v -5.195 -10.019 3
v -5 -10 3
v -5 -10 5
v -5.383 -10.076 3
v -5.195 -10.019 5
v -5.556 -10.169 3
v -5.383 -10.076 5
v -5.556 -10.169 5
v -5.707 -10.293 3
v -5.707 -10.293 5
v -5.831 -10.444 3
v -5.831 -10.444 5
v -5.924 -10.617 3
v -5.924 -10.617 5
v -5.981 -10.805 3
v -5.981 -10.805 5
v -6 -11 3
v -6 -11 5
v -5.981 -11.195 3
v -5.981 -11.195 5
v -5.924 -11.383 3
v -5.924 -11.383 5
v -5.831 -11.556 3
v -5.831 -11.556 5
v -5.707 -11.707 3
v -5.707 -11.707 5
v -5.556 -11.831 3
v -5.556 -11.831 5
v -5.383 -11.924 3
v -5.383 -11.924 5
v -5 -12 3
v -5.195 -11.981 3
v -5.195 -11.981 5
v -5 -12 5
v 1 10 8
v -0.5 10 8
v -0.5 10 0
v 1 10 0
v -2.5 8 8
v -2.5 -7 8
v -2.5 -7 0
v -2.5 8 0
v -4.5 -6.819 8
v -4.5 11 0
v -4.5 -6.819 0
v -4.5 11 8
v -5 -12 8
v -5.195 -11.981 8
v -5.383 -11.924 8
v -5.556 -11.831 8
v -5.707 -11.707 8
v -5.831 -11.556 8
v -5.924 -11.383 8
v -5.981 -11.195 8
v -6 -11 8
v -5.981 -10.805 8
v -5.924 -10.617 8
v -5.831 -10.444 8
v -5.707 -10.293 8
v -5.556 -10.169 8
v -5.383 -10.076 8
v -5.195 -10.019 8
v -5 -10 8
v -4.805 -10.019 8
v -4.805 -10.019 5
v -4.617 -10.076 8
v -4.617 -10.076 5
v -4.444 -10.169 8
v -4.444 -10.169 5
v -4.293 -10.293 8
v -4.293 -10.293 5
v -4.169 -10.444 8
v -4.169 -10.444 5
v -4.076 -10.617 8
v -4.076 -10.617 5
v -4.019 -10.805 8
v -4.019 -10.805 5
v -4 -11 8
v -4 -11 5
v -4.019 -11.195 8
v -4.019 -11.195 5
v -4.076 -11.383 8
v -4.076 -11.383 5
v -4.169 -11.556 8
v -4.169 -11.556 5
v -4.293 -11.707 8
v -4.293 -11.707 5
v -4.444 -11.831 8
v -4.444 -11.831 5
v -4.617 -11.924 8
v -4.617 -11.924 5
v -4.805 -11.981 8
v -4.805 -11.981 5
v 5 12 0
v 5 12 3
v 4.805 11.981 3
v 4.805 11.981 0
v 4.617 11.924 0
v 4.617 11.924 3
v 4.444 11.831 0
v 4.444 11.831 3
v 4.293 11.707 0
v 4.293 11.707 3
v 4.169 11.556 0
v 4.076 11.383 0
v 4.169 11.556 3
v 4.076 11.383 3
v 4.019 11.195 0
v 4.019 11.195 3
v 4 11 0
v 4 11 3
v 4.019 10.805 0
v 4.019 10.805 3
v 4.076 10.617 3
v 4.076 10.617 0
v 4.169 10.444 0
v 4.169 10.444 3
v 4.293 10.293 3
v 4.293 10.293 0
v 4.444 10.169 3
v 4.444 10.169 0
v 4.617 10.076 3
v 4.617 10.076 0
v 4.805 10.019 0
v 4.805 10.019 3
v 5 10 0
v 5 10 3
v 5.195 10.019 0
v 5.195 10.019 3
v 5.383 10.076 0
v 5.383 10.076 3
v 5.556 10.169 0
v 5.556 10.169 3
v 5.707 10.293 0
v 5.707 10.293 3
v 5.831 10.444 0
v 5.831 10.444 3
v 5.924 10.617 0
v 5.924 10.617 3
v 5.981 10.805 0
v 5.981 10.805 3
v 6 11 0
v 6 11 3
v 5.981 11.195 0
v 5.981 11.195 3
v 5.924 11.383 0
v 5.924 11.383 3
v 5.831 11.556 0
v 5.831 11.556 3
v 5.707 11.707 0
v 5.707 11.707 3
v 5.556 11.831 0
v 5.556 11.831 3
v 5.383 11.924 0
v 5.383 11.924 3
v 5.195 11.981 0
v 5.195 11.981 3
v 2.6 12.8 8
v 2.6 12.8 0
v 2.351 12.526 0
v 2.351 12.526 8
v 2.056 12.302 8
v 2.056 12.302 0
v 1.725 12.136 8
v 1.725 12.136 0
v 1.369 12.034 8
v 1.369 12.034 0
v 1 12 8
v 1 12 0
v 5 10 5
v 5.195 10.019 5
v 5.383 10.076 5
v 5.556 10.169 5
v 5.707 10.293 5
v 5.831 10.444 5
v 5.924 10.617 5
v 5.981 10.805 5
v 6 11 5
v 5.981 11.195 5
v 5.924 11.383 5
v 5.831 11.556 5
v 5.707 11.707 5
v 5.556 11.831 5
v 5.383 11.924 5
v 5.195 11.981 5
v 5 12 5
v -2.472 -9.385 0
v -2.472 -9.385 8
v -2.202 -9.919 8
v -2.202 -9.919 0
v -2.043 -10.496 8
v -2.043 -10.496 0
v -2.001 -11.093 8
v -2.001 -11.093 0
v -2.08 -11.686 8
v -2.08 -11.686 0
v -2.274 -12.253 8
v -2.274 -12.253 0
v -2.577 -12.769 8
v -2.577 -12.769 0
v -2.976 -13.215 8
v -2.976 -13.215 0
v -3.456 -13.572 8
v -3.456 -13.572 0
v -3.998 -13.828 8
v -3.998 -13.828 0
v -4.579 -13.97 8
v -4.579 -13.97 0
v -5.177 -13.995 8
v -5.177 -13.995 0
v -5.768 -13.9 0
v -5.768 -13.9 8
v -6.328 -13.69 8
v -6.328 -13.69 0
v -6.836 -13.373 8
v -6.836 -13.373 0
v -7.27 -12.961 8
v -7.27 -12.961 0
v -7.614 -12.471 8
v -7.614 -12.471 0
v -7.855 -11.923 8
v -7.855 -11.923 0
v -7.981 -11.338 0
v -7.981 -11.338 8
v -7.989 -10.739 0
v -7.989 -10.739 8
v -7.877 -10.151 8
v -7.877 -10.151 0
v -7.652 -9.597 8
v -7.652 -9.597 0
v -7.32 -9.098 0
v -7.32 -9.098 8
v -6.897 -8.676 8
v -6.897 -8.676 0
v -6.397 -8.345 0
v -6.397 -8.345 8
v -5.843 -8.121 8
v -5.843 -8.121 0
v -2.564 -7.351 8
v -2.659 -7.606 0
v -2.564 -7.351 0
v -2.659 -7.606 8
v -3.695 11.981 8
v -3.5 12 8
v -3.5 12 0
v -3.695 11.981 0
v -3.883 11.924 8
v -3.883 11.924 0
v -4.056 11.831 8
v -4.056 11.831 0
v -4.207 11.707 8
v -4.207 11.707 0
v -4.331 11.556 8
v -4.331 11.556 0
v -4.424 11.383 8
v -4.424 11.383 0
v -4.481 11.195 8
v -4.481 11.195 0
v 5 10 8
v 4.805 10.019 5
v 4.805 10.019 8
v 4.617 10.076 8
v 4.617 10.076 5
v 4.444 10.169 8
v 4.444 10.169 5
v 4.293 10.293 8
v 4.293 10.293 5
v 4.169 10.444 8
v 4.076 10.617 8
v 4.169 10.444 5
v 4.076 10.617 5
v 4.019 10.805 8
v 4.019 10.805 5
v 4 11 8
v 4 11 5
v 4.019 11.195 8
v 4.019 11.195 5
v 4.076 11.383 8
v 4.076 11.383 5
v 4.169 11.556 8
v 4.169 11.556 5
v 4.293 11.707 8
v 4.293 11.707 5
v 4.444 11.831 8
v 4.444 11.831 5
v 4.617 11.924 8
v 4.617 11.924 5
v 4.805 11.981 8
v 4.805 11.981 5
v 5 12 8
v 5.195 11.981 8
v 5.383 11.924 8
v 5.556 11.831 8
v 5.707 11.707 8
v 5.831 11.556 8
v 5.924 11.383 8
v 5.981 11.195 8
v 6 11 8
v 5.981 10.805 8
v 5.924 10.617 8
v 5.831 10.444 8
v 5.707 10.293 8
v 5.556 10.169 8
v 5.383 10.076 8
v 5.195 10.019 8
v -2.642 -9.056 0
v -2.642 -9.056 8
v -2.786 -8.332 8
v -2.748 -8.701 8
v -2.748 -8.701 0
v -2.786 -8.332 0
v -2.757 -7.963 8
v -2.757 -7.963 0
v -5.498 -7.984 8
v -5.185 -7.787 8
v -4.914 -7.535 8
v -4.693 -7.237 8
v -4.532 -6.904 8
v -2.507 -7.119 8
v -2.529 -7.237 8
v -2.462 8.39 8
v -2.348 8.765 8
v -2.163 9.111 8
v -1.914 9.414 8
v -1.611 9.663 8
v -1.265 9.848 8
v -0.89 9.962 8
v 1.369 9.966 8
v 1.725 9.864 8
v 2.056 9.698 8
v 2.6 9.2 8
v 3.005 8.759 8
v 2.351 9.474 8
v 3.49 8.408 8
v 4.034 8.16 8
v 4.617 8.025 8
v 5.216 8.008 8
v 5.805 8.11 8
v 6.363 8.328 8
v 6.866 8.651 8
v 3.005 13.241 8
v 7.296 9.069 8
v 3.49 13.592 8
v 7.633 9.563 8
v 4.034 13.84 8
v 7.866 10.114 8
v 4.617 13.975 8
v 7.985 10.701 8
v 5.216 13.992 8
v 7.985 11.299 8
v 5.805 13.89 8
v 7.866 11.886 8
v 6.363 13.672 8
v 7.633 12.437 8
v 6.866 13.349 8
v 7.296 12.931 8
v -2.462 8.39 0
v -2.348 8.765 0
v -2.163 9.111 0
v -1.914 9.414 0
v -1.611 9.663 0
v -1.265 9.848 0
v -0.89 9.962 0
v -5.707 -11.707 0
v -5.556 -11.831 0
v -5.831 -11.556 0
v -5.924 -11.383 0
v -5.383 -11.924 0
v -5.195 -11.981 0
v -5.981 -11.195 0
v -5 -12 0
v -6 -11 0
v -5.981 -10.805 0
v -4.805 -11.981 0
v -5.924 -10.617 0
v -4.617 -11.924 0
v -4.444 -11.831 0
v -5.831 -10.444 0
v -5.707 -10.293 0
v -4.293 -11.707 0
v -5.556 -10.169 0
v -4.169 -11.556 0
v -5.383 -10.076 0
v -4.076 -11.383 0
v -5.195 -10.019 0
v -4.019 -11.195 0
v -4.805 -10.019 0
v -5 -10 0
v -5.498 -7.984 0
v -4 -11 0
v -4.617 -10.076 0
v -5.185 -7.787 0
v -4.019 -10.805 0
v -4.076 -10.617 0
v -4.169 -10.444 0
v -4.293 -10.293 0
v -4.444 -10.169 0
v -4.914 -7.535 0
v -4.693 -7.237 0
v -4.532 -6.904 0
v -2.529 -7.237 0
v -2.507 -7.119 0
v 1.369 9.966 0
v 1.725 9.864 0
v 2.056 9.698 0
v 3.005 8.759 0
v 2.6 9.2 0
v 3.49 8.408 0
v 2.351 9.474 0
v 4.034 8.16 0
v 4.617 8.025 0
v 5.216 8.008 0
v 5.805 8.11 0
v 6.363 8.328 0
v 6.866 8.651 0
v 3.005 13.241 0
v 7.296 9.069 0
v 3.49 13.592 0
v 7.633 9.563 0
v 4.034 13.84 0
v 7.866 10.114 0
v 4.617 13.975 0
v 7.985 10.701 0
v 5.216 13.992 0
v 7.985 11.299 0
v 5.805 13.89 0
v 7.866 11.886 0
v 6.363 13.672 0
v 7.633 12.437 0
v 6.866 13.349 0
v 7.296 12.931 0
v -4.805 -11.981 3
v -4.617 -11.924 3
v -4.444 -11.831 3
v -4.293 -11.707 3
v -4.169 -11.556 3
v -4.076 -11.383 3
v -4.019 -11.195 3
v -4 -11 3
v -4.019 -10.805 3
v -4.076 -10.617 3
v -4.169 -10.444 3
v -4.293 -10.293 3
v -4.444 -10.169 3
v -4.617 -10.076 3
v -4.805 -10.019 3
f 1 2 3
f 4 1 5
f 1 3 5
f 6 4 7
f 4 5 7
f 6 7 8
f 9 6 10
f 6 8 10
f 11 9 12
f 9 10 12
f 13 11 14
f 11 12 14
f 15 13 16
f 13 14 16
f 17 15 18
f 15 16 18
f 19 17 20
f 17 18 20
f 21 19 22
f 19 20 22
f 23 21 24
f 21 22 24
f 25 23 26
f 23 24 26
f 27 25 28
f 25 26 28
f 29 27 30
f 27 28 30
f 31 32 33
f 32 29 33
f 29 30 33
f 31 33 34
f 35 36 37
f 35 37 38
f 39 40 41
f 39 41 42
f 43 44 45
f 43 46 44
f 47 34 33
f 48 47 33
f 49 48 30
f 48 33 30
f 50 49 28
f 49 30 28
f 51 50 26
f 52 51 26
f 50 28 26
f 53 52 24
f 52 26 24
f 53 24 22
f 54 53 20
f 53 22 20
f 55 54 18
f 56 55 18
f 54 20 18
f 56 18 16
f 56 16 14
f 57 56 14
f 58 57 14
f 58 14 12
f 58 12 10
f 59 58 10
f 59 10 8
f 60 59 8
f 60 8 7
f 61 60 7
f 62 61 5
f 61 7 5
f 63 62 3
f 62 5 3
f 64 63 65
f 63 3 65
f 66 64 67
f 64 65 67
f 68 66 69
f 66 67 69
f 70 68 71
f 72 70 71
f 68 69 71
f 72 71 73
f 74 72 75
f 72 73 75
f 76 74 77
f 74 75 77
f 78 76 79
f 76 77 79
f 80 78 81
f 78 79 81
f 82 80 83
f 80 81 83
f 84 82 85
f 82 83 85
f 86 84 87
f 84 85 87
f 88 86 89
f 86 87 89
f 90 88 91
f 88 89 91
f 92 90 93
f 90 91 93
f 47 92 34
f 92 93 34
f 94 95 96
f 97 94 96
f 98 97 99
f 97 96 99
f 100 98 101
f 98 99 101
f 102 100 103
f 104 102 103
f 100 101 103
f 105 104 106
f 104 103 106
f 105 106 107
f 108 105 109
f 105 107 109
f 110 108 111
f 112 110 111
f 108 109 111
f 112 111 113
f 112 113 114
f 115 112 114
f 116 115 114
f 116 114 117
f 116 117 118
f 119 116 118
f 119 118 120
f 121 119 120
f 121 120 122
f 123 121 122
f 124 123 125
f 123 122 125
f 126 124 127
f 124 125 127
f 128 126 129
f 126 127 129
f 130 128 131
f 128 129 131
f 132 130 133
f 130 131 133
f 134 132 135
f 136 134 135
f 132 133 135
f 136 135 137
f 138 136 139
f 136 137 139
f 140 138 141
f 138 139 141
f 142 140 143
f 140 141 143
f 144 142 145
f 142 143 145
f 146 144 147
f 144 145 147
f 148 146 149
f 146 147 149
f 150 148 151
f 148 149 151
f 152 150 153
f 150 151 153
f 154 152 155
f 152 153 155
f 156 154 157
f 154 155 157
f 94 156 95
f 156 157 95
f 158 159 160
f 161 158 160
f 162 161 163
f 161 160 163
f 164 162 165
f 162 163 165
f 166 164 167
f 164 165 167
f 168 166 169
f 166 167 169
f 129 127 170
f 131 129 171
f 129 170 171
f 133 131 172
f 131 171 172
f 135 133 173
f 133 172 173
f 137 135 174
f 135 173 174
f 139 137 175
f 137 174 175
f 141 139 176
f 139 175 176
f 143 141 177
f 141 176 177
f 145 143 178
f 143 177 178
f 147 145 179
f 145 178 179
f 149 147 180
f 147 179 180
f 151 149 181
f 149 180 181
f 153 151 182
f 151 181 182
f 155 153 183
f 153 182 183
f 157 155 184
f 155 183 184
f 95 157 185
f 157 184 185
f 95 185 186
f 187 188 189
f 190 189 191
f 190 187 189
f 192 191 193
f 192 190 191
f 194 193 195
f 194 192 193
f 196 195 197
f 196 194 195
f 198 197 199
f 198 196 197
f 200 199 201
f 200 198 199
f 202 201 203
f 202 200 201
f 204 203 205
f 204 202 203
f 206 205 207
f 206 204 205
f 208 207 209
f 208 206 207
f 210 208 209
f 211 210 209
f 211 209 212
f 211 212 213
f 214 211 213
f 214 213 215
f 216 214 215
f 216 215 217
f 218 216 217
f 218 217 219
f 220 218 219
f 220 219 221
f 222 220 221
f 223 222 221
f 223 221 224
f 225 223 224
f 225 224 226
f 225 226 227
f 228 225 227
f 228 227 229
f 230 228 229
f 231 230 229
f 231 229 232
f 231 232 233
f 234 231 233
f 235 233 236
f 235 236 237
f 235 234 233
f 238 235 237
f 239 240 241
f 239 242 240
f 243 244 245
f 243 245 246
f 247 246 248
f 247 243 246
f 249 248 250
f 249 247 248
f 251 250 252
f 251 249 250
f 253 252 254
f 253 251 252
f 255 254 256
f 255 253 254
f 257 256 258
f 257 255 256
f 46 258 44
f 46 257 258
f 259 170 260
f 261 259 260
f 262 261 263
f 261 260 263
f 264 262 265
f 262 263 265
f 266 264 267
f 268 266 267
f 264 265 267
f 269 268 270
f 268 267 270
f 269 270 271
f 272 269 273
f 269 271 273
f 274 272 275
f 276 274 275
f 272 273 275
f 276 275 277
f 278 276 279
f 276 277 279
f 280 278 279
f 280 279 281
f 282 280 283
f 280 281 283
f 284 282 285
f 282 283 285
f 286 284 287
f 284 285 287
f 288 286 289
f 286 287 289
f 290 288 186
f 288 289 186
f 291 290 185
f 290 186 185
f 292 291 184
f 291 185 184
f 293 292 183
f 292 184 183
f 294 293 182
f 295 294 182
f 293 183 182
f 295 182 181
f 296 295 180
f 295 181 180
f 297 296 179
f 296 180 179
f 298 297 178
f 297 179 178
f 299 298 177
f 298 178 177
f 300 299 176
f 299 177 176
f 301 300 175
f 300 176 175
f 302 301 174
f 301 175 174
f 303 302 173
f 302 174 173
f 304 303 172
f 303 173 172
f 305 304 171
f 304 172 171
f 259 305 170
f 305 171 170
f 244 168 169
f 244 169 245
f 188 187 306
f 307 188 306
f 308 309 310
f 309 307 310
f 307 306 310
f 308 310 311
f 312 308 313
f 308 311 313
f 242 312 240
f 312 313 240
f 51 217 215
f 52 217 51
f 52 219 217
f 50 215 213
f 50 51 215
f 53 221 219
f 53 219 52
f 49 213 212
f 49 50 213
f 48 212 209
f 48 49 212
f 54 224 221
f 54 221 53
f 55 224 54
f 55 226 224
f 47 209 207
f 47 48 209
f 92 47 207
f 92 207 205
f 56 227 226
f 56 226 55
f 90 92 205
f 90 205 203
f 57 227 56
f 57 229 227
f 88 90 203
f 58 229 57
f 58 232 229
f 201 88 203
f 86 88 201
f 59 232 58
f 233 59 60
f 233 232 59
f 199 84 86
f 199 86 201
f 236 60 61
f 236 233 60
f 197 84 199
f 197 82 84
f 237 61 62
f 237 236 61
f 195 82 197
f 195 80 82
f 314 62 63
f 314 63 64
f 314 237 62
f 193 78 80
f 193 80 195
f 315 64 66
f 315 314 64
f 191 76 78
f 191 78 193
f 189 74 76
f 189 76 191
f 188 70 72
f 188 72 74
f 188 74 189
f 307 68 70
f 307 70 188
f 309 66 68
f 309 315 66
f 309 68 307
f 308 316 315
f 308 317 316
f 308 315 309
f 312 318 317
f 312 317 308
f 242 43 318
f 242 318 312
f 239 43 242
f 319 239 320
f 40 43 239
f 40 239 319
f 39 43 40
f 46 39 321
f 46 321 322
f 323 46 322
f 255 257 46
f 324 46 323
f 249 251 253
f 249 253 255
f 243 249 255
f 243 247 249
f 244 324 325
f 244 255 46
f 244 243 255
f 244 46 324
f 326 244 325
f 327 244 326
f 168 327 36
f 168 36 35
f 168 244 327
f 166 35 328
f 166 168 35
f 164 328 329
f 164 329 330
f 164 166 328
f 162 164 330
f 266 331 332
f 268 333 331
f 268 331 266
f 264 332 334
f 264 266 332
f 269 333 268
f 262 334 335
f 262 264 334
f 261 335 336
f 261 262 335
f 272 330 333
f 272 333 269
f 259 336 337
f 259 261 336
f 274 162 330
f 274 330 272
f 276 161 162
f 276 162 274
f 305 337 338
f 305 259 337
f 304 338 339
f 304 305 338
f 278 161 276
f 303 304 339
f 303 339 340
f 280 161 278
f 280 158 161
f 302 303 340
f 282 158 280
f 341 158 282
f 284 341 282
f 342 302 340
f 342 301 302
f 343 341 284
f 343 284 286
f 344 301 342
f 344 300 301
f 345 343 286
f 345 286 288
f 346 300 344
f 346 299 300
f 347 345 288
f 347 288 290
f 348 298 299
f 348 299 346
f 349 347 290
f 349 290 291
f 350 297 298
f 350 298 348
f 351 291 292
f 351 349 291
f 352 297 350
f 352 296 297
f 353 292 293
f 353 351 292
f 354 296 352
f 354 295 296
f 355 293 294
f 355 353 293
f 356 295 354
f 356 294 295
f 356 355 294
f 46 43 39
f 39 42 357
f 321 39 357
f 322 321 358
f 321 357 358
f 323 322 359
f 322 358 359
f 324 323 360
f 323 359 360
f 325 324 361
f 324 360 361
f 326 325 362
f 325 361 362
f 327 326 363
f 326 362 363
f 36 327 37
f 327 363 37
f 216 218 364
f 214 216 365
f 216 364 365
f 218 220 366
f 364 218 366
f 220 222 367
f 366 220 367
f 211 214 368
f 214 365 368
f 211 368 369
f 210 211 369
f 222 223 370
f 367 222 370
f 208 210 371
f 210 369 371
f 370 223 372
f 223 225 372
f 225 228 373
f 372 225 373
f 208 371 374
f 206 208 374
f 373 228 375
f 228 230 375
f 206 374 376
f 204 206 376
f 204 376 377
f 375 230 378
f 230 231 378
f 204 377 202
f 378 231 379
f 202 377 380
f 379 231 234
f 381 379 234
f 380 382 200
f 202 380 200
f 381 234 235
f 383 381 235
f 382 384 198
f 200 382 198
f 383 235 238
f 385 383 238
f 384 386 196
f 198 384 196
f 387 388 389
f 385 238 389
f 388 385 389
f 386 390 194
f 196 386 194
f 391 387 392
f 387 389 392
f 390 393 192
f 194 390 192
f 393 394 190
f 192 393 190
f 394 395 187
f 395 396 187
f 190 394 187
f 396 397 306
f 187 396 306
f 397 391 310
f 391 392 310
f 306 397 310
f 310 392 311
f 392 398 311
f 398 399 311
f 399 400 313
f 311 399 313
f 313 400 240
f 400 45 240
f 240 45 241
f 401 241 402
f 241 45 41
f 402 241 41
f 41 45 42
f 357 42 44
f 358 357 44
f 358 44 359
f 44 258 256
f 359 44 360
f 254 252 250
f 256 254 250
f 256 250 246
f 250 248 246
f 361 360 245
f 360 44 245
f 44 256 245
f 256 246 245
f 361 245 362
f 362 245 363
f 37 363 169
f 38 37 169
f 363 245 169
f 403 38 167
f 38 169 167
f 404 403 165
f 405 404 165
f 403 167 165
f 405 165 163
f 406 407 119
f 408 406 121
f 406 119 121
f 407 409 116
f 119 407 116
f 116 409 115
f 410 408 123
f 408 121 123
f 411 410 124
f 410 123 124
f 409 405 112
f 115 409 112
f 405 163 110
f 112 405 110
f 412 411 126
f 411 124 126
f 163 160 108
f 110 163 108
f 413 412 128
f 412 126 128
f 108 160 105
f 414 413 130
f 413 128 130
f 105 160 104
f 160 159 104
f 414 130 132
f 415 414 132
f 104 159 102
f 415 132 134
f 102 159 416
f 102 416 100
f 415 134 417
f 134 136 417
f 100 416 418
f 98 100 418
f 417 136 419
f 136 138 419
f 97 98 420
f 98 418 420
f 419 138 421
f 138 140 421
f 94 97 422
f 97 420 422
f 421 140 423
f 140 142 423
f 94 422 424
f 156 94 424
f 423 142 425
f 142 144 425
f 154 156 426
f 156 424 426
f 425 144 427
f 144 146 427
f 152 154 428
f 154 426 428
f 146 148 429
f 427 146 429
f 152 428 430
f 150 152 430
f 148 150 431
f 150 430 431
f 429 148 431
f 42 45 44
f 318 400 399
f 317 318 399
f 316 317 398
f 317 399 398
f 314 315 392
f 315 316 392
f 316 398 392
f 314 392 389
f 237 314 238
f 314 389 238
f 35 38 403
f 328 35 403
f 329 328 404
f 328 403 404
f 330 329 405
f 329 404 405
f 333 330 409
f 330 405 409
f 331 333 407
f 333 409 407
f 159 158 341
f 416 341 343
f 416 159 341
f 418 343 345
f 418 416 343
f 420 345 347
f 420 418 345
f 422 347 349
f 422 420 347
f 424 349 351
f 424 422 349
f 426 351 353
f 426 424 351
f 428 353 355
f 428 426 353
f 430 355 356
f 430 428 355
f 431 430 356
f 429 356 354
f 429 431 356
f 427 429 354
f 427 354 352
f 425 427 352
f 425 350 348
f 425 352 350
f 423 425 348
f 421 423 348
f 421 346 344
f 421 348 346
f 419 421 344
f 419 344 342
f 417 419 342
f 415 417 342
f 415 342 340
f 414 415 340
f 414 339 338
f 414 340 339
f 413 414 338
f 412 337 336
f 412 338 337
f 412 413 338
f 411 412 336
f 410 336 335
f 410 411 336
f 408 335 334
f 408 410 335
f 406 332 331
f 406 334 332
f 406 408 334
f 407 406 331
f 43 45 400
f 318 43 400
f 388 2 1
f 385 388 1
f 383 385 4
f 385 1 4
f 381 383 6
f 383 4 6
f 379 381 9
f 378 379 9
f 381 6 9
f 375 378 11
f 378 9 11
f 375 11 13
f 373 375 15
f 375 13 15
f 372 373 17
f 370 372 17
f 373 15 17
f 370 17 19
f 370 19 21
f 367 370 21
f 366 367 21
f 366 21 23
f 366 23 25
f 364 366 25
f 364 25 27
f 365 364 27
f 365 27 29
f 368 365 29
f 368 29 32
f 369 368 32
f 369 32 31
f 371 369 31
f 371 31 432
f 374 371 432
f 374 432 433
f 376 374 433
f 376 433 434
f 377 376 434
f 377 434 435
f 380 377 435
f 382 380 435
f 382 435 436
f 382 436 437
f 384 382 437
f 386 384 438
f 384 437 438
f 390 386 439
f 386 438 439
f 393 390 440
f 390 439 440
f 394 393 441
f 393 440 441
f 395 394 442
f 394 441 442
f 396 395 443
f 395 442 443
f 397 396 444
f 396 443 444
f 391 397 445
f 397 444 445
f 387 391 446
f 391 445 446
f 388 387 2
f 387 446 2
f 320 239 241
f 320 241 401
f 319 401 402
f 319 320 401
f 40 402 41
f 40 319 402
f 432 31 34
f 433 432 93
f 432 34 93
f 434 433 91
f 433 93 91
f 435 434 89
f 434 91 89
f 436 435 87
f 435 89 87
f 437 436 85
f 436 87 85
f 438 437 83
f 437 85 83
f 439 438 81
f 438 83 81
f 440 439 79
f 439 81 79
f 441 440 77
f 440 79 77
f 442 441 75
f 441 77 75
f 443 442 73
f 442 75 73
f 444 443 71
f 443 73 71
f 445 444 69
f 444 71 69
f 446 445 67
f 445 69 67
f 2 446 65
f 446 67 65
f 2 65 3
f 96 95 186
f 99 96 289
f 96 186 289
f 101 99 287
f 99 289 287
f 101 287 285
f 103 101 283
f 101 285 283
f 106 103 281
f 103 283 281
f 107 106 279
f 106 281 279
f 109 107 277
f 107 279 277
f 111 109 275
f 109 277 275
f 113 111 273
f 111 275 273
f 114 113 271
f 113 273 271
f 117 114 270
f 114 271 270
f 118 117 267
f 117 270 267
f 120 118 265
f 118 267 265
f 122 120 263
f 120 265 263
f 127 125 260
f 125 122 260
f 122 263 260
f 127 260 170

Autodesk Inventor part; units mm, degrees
ref_plane "YZ Plane" through (0, 0, 0) normal (1, 0, 0) x (0, 1, 0)
ref_plane "XZ Plane" through (0, 0, 0) normal (0, 1, 0) x (-1, 0, 0)
ref_plane "XY Plane" through (0, 0, 0) normal (0, 0, 1) x (1, 0, 0)
sketch "Sketch1" plane through (0, 0, 0) normal (0, 0, 1) x (1, 0, 0)
  circle A0 centre (-5, -11) radius 3
  circle A1 centre (5, 11) radius 3
  point P0 (0, 0)
  dimension "d0" = 10
  dimension "d1" = 22
  dimension "d2" = 5
  dimension "d3" = 11
  dimension "d4" = 6
  dimension "d5" = 6
extrude "Extrusion1" add sketch "Sketch1" along normal blind 8
sketch "Sketch2" plane through (5, 11, 8) normal (0, 0, 1) x (1, 0, 0)
  circle A0 centre (0, 0) radius 3 projected
  circle A1 centre (-10, -22) radius 3 projected
  line L0 (-10, -22) -> (-8.5, -18) construction
  line L1 (-9.0637, -22.3511) -> (-7.5637, -18.3511)
  line L2 (-9.4363, -17.6489) -> (-10.9363, -21.6489)
  arc A2 (-10.9363, -21.6489) -> (-9.0637, -22.3511) centre (-10, -22) ccw
  arc A3 (-7.5637, -18.3511) -> (-9.4363, -17.6489) centre (-8.5, -18) ccw
  circle A4 centre (-8.5, 0) radius 1
  point P0 (-5, -11)
  point P1 (-10, -19)
  point P2 (-9.25, -20)
  dimension "d8" = 0
  dimension "d9" = 1.5
  dimension "d10" = 3
  dimension "d11" = 0
  dimension "d12" = 1.5
  dimension "d13" = 4
  dimension "d14" = 2
  dimension "d15" = 2
extrude "Extrusion2" add sketch "Sketch2" against normal blind 8 contours L1 A2 L2 A1 | A1 L2 A3 L1 | A4 picked at (-9.757, -21.03)
sketch "Sketch3" plane through (-3.5, 11, 8) normal (0, 0, 1) x (1, 0, 0)
  circle A0 centre (0, 0) radius 1 projected
  circle A1 centre (8.5, 0) radius 3 projected
  line L0 (0, 0) -> (8.5, 0) construction
  line L1 (0, -1) -> (8.5, -1)
  line L2 (8.5, 1) -> (0, 1)
  arc A2 (0, 1) -> (0, -1) centre (0, 0) ccw
  arc A3 (8.5, -1) -> (8.5, 1) centre (8.5, 0) ccw
  arc A4 (0.9363, -18.3511) -> (-0.9363, -17.6489) centre (0, -18) ccw projected
  line L3 (0, 0) -> (0, -18) construction
  line L4 (-1, 0) -> (-1, -18)
  line L5 (1, -18) -> (1, 0)
  arc A5 (1, 0) -> (-1, 0) centre (0, 0) ccw
  arc A6 (-1, -18) -> (1, -18) centre (0, -18) ccw
  point P0 (3.5, -11)
  point P1 (4.25, 0)
  point P2 (0, -9)
  point P3 (1, -1)
  point P4 (-1, 0)
extrude "Extrusion3" add sketch "Sketch3" against normal blind 8 contours A0 | L5 L1 A0 | A0 L2 A1 L1 L5 | L1 L5 A4 A6 L4 A0 | L2 A3 L1 A1 picked at (7.5064, 0.113)
fillet "Fillet1" radius 2 1 edges at (-2.5, 10, 4)
fillet "Fillet2" radius 2 4 edges at (2.1716, 10, 4) (-4.9432, -8.0005, 4) (-3.0705, -8.7028, 4) (2.1716, 12, 4)
sketch "Sketch4" plane through (0, 0, 0) normal (0, 0, -1) x (-1, 0, 0)
  arc A0 (-2.6, 12.8) -> (-2.6, 9.2) centre (-5, 11) ccw projected
  arc A1 (2.4719, -9.3848) -> (5.8427, -8.1208) centre (5, -11) ccw projected
  point P0 (0, 0)
hole "Hole1" at (5, 11, 0) at (-5, -11, 0) direction (0, 0, 1) diameter 2 depth 5 tip angle 118
sketch "Sketch5" plane through (0, 0, 8) normal (0, 0, 1) x (1, 0, 0)
  circle A0 centre (5, 11) radius 1 projected
  circle A1 centre (-5, -11) radius 1 projected
  point P0 (0, 0)
hole "Hole2" at (5, 11, 8) at (-5, -11, 8) direction (0, 0, -1) diameter 2 depth 5 tip angle 118
properties part number "back"
